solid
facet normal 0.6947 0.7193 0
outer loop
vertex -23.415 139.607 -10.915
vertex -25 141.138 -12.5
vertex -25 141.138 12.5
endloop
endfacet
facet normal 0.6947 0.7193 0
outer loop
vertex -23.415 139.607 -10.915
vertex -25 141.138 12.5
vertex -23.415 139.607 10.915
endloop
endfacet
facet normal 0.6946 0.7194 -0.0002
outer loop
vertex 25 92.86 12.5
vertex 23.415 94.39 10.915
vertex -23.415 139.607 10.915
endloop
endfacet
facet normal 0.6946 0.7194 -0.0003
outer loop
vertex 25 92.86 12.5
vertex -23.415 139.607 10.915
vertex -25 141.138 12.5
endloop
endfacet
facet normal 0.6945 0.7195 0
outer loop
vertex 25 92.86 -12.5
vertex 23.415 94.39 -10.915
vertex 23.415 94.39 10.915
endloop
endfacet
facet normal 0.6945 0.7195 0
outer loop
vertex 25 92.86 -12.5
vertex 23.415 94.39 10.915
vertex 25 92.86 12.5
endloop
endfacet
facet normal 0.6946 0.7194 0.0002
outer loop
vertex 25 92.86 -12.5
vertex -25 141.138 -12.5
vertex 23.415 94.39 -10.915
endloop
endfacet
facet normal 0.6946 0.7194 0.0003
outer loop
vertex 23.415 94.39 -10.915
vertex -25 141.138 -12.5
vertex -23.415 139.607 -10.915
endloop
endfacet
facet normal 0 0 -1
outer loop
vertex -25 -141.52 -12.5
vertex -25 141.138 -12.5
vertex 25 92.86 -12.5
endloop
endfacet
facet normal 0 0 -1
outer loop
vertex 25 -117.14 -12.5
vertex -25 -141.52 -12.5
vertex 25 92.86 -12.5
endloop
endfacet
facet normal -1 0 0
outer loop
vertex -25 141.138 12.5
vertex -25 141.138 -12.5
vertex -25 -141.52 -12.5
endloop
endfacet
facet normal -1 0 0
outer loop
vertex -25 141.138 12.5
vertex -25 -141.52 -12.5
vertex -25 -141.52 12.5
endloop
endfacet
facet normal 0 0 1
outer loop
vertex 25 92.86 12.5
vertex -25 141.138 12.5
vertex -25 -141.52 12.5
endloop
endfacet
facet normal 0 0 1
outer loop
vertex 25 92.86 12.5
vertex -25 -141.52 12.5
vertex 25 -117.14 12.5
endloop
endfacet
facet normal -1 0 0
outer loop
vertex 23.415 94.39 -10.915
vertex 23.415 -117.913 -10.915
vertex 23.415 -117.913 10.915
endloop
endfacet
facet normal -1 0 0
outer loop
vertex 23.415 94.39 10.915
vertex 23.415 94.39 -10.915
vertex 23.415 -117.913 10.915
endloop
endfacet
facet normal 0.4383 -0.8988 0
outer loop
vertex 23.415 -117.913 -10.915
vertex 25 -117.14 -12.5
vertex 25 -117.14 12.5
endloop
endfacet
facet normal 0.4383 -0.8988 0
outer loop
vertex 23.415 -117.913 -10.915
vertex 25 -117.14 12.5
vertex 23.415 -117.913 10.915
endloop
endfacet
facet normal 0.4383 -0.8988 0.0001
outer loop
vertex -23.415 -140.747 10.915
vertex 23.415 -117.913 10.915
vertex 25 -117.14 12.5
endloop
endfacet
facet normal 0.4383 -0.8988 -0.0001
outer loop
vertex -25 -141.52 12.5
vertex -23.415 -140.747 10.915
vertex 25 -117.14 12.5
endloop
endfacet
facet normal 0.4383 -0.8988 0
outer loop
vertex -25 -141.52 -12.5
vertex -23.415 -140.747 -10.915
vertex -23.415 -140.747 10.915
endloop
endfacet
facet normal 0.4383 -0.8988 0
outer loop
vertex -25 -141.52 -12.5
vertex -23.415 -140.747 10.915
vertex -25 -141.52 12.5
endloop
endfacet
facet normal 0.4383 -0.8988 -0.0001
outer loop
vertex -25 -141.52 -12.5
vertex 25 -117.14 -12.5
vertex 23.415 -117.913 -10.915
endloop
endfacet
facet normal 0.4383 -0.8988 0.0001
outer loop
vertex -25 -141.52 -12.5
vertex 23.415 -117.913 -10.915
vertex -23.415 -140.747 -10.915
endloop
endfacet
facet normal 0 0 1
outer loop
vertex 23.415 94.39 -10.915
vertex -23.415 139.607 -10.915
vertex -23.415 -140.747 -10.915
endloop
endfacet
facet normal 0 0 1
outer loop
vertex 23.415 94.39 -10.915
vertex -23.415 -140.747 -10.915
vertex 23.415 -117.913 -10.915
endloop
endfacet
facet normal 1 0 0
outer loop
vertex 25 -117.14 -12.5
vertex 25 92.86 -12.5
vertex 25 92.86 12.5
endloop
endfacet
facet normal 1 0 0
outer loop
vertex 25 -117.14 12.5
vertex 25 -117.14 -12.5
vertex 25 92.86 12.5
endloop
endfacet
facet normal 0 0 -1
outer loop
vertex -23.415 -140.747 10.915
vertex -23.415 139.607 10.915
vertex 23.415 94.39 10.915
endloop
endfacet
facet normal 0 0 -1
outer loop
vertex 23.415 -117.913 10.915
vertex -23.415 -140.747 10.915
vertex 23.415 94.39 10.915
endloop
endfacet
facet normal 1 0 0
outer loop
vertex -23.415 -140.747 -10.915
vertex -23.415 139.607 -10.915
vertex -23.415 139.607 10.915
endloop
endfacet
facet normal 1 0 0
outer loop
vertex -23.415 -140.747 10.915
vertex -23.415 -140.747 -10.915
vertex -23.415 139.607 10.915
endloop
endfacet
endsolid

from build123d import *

# Parameters (mm, degrees)
F0_W        = 50
F0_H        = 25
F0_W_2      = 46.83
F0_H_2      = 21.83
F1_DEPTH    = 141.91
F2_T1_DEPTH = 288.1699043199
F3_T1_DEPTH = 286.404275023


# Not quite as in the source:
# - a fillet or chamfer that OpenCascade refuses, or shapes differently, is made with other operations: its cross-section is extruded or revolved along the edge and cut away or added


with BuildPart() as f1:
    # F0 (on Front) → F1 (new body, symmetric)
    with BuildSketch(Plane.XZ):
        Rectangle(F0_W, F0_H)
        Rectangle(F0_W_2, F0_H_2, mode=Mode.SUBTRACT)
    extrude(amount=F1_DEPTH, both=True)

    # F2: chamfer of 50.8 x 24.77 on 1 edges, made by hand

    # F2_s2 → F2_t1 (cut)
    with BuildSketch(Plane.XY.offset(-144.08495216)):
        Polygon((25, -117.14), (-25.8, -141.91), (25, -141.91), align=None)
    extrude(amount=F2_T1_DEPTH, mode=Mode.SUBTRACT)

    # F3: chamfer of 50.8 x 49.05 on 1 edges, made by hand

    # F3_s2 → F3_t1 (cut)
    with BuildSketch(Plane.XY.offset(-143.2021375115)):
        Polygon((-25.8, 141.91), (25, 92.86), (25, 141.91), align=None)
    extrude(amount=F3_T1_DEPTH, mode=Mode.SUBTRACT)


solid = f1.part
